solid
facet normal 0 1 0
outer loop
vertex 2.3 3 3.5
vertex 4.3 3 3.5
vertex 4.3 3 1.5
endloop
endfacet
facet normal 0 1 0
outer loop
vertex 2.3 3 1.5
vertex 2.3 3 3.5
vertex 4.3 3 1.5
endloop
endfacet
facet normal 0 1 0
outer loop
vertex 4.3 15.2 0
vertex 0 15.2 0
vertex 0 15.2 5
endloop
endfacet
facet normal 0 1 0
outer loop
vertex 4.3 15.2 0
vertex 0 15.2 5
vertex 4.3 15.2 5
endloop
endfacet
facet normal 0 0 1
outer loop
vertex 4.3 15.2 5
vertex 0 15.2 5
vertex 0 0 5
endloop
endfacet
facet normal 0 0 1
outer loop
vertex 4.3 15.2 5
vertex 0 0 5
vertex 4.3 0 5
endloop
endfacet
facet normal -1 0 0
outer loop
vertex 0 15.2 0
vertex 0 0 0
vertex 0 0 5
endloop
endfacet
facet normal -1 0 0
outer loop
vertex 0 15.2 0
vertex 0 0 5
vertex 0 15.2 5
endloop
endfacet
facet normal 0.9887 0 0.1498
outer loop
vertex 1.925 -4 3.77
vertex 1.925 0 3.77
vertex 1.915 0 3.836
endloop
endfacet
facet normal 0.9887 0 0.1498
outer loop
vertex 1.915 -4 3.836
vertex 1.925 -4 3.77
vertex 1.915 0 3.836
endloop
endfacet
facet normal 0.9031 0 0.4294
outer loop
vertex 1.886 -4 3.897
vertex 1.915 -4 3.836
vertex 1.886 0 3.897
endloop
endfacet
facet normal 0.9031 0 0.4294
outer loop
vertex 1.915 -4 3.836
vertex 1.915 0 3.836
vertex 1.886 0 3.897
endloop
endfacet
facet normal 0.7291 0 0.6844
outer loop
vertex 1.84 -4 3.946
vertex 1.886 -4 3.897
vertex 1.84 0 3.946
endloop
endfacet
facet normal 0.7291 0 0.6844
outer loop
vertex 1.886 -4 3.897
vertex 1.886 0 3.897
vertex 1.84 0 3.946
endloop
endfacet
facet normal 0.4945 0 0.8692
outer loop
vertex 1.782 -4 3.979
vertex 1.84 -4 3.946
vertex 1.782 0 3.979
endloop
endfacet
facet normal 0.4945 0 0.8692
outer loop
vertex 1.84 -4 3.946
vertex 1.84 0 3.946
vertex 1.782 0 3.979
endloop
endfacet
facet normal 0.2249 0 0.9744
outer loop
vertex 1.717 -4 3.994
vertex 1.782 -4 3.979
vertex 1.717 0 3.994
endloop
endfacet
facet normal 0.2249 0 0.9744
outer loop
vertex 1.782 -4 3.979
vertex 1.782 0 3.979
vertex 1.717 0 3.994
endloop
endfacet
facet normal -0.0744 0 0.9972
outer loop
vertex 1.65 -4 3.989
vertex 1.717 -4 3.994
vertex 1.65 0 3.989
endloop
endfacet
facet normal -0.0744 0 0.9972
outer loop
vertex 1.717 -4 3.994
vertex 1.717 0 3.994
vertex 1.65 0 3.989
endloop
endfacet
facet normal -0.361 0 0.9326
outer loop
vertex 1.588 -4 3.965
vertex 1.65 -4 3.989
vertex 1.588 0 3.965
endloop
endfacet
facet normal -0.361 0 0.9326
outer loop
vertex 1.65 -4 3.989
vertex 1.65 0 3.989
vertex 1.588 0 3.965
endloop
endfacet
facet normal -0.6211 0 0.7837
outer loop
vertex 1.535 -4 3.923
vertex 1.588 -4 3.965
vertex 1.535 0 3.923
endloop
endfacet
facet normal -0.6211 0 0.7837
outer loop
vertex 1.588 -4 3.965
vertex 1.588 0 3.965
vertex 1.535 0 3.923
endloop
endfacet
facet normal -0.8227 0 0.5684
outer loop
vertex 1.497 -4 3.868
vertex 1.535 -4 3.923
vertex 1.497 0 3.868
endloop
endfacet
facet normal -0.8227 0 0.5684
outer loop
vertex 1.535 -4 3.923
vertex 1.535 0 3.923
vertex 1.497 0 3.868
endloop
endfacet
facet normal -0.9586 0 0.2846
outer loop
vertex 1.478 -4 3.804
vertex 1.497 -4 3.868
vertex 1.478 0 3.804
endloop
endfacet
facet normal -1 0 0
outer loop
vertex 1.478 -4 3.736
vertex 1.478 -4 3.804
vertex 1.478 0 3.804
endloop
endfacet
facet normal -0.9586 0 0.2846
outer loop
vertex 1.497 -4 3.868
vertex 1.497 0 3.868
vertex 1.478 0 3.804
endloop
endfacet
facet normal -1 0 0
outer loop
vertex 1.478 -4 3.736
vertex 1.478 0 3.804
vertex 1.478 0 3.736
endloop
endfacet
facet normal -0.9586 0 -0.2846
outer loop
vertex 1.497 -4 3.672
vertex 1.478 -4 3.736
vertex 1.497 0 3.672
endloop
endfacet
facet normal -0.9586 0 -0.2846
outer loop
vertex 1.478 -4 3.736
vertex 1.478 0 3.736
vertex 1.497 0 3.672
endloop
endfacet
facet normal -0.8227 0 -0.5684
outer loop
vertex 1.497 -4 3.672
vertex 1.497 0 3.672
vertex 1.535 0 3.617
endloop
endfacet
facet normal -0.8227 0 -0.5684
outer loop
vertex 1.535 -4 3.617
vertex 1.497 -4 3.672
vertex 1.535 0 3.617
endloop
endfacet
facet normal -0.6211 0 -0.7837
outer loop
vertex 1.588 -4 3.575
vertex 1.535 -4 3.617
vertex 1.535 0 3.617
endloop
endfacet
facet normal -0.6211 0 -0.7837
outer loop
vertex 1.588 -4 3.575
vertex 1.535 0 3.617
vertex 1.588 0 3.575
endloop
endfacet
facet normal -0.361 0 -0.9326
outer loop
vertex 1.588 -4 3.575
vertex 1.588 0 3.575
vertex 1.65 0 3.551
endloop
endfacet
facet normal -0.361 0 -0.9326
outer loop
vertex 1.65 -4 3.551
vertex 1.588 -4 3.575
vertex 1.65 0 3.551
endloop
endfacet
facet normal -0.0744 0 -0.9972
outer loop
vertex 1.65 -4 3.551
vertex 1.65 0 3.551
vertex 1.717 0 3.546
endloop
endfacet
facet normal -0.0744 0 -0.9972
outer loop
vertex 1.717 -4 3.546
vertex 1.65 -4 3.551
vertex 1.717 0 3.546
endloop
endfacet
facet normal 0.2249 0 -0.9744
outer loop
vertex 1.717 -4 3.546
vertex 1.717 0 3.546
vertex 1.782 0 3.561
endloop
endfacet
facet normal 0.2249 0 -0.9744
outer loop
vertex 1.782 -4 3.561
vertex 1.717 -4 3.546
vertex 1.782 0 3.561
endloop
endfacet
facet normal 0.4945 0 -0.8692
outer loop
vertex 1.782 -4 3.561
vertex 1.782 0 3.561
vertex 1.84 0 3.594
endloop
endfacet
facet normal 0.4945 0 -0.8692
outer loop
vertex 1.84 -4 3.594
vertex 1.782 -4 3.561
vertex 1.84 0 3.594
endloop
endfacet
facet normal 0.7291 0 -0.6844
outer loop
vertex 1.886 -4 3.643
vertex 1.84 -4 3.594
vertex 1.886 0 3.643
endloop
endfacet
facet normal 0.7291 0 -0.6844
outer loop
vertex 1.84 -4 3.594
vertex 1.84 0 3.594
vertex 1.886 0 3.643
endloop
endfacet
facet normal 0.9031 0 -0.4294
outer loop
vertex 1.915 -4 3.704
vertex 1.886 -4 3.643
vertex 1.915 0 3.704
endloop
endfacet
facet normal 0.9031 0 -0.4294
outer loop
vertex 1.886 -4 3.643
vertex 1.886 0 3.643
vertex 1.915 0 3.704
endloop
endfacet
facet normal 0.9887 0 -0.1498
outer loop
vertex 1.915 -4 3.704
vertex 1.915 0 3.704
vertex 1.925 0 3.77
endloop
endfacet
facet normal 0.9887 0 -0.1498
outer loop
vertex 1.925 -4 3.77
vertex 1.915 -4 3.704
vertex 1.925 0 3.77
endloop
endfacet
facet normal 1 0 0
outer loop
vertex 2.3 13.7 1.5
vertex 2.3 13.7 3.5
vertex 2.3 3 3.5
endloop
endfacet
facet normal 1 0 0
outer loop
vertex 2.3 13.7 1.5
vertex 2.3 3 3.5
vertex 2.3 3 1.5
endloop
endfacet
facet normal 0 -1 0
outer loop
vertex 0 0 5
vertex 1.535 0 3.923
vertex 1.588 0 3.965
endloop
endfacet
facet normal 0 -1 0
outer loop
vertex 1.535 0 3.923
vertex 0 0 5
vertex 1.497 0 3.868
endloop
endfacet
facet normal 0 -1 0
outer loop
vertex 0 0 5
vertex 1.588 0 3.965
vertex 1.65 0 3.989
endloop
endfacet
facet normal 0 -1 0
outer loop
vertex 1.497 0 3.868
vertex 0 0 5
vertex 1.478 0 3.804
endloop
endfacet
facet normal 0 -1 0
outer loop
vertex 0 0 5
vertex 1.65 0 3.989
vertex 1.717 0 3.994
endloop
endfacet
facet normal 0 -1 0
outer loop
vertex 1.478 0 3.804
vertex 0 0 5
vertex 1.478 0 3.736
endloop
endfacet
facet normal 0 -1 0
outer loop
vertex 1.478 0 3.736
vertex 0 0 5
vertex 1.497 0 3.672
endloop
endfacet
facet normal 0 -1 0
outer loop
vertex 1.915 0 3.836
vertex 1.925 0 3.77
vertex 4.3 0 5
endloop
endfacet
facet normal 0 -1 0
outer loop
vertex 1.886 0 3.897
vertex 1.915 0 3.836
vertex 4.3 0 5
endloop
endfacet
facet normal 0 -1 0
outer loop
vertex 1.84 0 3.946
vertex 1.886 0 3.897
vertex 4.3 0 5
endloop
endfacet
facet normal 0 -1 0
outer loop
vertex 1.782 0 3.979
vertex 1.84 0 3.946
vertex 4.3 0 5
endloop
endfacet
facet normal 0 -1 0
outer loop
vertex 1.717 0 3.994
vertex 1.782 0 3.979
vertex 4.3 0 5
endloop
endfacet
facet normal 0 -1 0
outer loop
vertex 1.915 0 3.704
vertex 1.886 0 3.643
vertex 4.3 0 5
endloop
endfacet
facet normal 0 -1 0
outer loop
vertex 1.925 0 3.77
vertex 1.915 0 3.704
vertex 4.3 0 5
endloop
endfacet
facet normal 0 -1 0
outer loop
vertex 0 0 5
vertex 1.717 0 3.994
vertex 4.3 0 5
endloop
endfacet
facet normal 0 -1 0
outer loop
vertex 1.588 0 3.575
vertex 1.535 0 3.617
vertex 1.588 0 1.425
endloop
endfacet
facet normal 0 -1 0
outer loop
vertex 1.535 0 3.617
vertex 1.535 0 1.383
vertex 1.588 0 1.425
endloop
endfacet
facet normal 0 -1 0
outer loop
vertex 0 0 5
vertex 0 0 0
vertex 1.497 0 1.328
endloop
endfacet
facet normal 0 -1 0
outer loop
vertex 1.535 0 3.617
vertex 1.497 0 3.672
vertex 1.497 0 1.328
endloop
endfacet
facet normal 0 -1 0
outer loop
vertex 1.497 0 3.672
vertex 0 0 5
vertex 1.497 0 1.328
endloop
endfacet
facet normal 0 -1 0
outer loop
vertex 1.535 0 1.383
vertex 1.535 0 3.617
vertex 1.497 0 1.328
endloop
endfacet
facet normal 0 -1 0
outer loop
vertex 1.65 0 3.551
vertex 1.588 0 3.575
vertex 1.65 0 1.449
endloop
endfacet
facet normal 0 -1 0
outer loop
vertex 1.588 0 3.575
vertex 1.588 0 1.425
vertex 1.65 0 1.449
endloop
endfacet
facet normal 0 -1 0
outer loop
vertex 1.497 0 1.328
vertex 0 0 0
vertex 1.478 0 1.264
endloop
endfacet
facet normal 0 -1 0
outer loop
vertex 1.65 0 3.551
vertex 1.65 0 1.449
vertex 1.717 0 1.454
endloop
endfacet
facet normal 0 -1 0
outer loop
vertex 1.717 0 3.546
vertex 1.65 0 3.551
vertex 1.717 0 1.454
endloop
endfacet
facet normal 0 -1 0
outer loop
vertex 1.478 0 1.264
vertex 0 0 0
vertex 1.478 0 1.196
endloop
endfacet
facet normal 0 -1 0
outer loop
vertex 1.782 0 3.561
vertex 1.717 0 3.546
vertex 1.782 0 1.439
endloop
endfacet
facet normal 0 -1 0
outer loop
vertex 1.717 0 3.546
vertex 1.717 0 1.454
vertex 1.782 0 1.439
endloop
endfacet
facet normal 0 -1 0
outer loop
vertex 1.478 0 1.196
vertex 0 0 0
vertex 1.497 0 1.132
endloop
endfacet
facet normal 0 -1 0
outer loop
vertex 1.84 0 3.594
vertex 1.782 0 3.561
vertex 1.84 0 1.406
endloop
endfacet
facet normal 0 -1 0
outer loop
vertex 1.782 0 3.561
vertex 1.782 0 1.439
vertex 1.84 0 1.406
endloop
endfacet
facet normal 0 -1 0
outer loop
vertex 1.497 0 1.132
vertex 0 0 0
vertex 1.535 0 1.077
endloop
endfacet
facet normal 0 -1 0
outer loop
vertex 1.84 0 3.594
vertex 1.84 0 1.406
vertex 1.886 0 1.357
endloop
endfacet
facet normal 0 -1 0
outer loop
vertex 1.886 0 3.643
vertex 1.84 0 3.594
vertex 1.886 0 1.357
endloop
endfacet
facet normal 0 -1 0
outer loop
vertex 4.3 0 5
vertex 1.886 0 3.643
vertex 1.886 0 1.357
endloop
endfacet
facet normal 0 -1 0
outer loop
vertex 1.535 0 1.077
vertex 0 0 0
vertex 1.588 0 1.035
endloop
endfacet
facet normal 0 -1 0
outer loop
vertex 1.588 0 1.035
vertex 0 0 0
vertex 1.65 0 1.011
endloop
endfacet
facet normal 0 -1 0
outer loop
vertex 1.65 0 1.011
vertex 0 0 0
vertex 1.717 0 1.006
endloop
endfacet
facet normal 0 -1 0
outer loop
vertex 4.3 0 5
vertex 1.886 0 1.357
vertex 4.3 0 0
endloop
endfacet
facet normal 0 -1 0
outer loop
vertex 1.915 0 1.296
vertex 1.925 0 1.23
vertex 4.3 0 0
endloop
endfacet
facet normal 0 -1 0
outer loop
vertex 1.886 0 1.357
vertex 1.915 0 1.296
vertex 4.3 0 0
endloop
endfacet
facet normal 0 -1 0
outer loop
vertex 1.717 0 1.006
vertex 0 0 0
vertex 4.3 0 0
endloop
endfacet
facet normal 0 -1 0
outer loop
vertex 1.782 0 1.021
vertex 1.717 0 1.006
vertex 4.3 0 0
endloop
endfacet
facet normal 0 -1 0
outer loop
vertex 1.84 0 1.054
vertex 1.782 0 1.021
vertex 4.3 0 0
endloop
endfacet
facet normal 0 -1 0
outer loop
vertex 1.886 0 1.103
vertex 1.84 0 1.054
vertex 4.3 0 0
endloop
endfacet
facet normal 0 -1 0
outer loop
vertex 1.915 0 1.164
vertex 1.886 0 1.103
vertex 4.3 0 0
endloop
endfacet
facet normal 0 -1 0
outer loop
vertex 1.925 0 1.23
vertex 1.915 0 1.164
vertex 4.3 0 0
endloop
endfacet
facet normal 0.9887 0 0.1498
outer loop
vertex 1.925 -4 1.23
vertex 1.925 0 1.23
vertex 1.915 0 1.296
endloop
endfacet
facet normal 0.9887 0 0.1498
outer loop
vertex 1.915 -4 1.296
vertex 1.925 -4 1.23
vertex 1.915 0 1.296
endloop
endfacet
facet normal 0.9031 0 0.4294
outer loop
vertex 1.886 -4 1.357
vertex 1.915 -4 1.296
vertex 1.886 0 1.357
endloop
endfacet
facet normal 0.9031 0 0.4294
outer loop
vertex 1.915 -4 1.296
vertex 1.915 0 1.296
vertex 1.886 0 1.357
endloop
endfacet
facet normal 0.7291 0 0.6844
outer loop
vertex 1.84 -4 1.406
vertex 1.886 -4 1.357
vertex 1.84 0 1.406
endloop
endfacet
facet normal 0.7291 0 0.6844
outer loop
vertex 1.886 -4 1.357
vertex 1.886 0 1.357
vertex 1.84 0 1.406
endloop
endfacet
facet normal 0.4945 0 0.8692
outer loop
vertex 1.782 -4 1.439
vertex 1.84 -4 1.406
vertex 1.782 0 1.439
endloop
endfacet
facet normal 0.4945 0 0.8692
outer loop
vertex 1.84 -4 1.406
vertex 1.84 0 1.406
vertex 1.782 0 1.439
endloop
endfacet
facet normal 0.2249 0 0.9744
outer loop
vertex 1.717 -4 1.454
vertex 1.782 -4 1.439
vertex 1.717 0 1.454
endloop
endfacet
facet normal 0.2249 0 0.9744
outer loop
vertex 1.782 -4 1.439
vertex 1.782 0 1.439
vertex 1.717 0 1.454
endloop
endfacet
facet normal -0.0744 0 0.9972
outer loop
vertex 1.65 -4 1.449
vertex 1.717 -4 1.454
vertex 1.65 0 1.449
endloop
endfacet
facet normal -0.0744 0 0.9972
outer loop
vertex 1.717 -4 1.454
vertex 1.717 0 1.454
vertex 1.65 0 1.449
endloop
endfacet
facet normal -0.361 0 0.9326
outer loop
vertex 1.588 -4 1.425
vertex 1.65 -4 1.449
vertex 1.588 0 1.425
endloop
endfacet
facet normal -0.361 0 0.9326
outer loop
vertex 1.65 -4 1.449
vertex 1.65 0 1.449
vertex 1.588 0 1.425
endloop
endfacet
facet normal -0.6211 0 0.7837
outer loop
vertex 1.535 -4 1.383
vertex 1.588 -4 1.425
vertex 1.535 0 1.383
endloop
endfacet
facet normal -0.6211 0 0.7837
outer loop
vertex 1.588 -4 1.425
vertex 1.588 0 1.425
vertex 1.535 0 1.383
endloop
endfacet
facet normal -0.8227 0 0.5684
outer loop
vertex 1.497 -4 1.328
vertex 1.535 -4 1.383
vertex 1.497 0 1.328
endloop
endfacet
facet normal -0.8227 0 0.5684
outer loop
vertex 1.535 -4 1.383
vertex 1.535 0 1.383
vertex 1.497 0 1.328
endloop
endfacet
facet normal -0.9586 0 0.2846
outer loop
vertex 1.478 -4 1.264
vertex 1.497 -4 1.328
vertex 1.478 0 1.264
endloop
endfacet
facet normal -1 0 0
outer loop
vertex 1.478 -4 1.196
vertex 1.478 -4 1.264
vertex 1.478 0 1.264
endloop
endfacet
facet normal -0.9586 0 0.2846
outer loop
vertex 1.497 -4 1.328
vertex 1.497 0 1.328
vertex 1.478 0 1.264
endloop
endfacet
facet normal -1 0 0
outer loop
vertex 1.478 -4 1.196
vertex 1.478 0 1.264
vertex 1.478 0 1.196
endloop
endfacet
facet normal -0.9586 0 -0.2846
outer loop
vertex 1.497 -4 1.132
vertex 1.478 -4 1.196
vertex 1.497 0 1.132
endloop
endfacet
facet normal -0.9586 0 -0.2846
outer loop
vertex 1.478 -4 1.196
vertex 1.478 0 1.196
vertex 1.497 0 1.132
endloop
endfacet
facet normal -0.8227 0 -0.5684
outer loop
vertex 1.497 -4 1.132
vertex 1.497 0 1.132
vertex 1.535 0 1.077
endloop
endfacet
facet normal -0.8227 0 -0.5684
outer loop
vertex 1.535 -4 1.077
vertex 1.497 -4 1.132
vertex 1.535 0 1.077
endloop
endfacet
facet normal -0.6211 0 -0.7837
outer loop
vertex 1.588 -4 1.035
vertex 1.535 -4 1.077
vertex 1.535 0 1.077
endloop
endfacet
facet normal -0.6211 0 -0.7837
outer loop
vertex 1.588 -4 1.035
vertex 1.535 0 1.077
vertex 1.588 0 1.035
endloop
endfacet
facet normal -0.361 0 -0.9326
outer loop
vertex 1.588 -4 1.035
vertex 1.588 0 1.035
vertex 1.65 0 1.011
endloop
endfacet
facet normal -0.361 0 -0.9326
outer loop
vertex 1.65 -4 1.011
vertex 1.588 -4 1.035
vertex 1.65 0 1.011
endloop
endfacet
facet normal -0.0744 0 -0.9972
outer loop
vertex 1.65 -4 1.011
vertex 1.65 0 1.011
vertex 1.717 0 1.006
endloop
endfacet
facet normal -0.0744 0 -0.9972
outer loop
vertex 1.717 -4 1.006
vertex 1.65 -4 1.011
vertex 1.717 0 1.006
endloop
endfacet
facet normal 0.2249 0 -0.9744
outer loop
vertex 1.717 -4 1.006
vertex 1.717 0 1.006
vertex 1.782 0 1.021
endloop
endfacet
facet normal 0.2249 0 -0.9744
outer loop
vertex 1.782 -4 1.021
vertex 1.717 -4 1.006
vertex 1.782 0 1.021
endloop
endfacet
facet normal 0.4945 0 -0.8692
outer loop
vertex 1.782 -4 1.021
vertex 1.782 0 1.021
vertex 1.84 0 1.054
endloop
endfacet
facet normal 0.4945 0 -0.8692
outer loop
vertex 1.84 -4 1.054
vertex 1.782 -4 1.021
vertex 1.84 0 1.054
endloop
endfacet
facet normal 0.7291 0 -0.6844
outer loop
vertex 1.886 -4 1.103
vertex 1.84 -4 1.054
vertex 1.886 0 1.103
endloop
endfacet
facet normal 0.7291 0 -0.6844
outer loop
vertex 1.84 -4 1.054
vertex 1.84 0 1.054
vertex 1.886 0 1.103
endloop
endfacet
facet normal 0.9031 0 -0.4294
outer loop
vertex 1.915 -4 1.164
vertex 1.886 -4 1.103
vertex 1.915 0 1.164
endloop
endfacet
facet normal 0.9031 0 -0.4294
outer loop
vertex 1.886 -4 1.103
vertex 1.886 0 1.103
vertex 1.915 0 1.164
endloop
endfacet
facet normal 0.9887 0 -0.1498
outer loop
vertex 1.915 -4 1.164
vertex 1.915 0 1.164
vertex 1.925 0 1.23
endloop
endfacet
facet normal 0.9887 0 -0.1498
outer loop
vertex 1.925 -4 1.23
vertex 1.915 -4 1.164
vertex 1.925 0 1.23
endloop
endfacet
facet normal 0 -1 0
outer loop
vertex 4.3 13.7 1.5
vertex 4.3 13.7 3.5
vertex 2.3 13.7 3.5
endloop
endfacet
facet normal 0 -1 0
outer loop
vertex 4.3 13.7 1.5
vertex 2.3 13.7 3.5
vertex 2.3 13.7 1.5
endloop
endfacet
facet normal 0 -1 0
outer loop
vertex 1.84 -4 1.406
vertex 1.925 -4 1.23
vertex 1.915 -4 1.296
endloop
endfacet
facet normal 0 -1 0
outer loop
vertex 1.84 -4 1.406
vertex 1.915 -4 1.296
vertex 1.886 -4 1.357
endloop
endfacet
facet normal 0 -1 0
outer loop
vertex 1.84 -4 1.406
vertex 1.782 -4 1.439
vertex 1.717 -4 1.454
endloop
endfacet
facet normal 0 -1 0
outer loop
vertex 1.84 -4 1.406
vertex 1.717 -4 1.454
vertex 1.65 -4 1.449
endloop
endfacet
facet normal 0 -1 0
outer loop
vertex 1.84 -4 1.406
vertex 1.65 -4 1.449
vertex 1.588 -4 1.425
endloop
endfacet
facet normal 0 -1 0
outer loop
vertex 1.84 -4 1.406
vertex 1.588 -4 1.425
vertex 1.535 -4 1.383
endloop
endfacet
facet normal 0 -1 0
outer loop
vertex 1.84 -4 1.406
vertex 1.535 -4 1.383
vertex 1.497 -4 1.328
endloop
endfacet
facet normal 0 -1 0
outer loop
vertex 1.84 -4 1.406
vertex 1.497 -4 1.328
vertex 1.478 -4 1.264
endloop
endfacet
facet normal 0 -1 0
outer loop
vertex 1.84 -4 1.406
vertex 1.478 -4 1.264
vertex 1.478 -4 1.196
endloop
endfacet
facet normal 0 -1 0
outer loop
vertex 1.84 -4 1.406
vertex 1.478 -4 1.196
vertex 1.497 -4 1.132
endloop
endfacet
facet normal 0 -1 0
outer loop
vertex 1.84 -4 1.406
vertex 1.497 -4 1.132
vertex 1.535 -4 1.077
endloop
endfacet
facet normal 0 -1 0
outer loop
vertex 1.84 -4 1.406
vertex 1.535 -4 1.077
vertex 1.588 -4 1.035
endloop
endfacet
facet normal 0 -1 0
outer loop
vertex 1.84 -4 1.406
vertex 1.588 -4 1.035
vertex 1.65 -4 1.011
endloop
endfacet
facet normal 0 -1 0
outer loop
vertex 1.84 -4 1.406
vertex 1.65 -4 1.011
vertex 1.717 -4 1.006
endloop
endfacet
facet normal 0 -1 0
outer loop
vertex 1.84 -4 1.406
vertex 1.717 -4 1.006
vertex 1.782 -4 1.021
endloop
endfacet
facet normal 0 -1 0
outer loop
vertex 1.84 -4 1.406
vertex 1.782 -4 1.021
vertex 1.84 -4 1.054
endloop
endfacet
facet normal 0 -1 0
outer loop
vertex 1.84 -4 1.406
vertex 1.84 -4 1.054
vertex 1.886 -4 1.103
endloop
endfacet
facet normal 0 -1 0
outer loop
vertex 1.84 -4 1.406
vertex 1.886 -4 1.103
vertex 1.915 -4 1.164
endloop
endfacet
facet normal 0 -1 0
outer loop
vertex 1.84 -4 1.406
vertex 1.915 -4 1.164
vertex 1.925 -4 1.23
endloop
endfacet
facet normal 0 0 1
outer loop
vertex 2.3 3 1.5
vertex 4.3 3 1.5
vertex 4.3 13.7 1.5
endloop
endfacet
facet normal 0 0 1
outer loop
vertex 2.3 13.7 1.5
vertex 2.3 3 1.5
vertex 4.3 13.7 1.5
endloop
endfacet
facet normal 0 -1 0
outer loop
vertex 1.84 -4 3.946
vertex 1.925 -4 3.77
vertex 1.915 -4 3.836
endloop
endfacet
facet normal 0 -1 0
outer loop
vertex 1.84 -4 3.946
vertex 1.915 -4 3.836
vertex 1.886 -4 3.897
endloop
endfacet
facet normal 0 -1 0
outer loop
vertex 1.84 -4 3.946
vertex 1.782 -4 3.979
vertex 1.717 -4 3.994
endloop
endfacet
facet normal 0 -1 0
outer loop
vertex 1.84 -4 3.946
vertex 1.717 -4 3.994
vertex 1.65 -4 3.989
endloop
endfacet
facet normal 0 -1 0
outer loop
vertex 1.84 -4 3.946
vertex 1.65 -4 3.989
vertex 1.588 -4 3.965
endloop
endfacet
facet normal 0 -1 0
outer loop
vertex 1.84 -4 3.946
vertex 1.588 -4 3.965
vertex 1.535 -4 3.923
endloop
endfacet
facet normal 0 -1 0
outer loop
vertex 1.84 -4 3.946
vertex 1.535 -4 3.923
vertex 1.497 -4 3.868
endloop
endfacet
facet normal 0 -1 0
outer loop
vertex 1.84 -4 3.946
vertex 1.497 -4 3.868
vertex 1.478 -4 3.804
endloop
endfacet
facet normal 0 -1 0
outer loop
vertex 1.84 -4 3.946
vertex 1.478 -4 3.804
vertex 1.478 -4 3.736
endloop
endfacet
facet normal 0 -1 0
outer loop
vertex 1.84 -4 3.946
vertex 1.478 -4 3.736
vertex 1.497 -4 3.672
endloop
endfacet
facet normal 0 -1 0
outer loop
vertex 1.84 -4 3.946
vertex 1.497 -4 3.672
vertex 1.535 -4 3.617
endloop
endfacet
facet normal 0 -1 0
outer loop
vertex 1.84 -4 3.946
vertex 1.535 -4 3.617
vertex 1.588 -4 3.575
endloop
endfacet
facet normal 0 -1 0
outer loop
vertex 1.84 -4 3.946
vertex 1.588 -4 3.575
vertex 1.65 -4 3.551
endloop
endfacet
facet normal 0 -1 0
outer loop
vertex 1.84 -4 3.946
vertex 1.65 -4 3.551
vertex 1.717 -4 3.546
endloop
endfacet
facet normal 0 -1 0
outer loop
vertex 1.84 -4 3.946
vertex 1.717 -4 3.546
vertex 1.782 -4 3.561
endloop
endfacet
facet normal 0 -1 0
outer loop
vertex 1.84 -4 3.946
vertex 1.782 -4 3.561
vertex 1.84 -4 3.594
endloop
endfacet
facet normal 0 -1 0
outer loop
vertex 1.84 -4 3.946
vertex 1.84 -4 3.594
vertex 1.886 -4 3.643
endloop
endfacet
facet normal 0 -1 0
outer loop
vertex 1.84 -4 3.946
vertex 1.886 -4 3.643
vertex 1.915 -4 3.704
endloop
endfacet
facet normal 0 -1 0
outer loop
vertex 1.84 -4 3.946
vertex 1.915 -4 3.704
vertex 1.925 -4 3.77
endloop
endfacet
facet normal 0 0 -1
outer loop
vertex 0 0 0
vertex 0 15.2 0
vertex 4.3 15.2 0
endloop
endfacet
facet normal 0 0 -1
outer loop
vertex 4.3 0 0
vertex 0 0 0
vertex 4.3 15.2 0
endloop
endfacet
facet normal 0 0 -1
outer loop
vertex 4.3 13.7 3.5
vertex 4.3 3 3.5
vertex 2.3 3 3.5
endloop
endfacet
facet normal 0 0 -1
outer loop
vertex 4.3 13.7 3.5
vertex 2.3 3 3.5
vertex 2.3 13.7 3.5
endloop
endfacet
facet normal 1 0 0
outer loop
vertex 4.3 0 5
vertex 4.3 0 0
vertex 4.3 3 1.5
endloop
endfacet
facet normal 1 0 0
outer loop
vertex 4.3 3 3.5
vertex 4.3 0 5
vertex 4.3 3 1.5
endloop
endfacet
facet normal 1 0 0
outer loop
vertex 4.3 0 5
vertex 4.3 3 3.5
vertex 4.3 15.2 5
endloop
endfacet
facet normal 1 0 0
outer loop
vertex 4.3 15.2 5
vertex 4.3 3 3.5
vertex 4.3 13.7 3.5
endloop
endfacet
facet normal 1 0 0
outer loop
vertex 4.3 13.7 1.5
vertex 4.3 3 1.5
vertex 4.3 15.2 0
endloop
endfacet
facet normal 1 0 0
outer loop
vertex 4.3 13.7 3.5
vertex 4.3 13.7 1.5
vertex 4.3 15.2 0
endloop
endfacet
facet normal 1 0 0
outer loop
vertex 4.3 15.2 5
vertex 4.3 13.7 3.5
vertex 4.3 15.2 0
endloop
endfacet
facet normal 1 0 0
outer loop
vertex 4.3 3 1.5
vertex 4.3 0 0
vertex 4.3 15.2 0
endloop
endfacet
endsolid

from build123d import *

# Parameters (mm, degrees)
SKETCH1_W           = 4.3
SKETCH1_H           = 15.2
BOSS_EXTRUDE1_DEPTH = 5
SKETCH2_W           = 2
SKETCH2_H           = 10.7
CUT_EXTRUDE1_DEPTH  = 2
SKETCH3_R           = 0.225
BOSS_EXTRUDE2_DEPTH = 4


with BuildPart() as part:
    # Sketch1 → Boss-Extrude1 (new body)
    with BuildSketch(Plane.XY):
        with Locations((2.15, 7.6)):
            Rectangle(SKETCH1_W, SKETCH1_H)
    extrude(amount=BOSS_EXTRUDE1_DEPTH)

    # Sketch2 → Cut-Extrude1 (cut)
    with BuildSketch(Plane(origin=(4.3, 0, 0), x_dir=(0, 0, -1), z_dir=(1, 0, 0))):
        with Locations((-2.5, 8.35)):
            Rectangle(SKETCH2_W, SKETCH2_H)
    extrude(amount=-CUT_EXTRUDE1_DEPTH, mode=Mode.SUBTRACT)

    # Sketch3 → Boss-Extrude2 (add)
    with BuildSketch(Plane.XZ):
        with Locations((1.7, 1.23)):
            Circle(SKETCH3_R)
        with Locations((1.7, 3.77)):
            Circle(SKETCH3_R)
    extrude(amount=BOSS_EXTRUDE2_DEPTH)


solid = part.part
